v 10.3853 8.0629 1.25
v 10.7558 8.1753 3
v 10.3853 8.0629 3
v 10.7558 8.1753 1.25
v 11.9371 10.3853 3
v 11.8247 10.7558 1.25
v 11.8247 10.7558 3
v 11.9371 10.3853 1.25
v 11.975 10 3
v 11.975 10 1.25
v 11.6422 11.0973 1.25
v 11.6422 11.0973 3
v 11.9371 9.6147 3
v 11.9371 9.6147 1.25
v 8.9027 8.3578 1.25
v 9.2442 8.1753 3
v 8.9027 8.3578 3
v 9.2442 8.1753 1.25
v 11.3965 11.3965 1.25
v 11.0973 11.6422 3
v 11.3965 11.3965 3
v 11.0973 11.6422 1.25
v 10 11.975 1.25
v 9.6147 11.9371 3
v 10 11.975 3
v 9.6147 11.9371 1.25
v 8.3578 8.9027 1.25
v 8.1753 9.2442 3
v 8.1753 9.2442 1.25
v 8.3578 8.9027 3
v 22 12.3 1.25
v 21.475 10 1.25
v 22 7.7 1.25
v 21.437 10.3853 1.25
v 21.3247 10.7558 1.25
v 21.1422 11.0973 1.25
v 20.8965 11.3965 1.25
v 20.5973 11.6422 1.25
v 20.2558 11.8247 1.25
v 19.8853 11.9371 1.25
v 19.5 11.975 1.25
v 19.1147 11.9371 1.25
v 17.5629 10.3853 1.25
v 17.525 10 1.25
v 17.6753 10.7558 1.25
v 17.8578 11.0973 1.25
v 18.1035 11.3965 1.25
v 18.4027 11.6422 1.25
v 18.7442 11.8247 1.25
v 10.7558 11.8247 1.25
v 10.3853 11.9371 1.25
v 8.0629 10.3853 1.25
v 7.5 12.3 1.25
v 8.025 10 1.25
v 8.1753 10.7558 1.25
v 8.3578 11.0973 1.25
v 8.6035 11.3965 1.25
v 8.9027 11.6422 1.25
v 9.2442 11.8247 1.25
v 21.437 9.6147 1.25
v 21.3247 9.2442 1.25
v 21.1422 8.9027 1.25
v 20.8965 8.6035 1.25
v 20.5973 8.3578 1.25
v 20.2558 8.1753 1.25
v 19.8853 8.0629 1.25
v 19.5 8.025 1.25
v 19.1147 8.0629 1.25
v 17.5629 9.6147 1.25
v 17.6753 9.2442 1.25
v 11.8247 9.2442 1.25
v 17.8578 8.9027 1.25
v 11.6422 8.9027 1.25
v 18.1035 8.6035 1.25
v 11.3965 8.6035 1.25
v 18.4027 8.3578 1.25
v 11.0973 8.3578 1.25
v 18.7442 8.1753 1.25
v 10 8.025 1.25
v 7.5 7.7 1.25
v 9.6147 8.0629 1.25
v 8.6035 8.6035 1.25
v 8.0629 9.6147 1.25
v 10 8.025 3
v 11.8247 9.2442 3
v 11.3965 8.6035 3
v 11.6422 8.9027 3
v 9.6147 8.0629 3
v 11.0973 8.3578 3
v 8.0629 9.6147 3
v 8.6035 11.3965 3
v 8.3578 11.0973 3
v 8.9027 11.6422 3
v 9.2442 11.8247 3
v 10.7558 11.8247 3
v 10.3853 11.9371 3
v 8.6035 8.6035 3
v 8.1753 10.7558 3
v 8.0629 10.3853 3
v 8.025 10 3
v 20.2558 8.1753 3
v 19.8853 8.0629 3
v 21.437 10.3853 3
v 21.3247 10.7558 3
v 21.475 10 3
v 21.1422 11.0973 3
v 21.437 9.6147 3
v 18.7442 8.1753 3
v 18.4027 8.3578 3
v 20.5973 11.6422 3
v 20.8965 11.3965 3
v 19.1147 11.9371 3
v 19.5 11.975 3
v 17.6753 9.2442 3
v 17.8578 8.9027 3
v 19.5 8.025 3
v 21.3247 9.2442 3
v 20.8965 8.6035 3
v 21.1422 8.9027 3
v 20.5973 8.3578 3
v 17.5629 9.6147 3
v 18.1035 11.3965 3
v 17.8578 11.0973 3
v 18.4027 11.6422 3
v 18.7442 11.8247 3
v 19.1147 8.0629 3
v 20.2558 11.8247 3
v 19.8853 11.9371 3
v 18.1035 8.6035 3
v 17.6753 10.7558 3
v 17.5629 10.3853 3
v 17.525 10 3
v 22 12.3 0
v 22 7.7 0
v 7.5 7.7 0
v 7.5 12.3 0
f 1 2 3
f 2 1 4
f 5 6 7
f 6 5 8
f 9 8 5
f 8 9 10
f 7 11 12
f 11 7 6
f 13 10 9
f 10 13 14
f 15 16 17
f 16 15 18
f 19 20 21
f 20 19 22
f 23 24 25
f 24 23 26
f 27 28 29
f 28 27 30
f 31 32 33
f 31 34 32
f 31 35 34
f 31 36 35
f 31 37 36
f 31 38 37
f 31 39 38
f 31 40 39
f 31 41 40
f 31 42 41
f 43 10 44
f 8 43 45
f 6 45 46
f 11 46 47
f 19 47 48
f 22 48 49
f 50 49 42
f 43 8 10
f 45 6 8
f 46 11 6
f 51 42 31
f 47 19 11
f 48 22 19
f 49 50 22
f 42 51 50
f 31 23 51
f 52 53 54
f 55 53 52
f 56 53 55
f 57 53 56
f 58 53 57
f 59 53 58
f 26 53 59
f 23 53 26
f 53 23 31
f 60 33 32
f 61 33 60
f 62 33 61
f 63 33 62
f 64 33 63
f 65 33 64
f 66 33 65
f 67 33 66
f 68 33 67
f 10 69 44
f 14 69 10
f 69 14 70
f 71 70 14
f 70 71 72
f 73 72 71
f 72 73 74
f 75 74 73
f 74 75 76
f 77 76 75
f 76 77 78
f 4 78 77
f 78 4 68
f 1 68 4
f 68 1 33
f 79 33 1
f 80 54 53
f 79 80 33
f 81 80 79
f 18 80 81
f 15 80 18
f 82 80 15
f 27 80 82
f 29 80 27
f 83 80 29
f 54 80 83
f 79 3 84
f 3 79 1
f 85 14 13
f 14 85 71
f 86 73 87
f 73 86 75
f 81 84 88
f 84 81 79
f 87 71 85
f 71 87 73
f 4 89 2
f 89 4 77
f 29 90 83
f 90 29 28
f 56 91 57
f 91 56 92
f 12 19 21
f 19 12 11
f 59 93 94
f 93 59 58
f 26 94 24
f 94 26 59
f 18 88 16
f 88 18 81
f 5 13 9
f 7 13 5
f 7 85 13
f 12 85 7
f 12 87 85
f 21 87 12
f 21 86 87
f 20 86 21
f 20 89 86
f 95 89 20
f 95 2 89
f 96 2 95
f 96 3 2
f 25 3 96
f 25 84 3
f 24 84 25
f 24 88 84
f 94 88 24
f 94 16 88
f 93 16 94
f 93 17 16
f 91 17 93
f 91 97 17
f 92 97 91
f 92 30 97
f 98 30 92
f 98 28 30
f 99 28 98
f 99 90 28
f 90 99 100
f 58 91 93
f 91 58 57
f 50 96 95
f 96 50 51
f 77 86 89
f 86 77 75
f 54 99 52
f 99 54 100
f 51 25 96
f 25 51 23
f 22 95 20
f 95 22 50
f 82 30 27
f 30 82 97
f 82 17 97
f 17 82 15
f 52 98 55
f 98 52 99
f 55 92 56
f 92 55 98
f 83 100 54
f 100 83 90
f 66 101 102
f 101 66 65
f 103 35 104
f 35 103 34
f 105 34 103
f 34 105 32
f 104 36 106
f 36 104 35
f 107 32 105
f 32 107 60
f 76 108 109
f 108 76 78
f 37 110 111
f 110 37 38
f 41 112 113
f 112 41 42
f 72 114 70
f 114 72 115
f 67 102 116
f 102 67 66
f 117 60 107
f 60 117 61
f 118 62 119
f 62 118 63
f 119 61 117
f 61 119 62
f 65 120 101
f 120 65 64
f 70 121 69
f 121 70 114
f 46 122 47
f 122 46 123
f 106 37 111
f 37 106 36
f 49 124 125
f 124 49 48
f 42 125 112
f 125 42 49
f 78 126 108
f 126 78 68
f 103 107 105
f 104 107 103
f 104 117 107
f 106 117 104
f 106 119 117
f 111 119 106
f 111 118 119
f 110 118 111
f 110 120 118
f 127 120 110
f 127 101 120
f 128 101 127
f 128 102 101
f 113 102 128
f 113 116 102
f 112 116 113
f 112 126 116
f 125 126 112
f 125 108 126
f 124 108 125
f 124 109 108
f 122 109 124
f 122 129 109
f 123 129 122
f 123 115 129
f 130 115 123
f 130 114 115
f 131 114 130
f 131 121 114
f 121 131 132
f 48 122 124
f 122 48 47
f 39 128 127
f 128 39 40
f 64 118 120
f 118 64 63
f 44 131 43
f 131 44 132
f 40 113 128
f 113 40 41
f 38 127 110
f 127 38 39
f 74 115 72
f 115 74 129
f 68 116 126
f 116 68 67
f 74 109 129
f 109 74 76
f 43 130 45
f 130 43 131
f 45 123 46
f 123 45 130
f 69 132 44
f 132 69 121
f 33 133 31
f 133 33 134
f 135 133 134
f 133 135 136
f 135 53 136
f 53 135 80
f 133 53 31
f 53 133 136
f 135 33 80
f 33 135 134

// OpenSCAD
// Dholydai: 28 Mar 2025

$fn=32;

//Reset and Run Covers
translate([0,0,1.25])
rotate([0,0,0]){
     #translate([10,10,0])
         cylinder(d=3.95,h=1.75);
     }

translate([0,0,1.25])     
rotate([0,0,0]){
     #translate([19.5,10,0])
         cylinder(d=3.95,h=1.75);
     }
translate([7.5,7.7,0])
cube([14.5,4.6,1.25]);
